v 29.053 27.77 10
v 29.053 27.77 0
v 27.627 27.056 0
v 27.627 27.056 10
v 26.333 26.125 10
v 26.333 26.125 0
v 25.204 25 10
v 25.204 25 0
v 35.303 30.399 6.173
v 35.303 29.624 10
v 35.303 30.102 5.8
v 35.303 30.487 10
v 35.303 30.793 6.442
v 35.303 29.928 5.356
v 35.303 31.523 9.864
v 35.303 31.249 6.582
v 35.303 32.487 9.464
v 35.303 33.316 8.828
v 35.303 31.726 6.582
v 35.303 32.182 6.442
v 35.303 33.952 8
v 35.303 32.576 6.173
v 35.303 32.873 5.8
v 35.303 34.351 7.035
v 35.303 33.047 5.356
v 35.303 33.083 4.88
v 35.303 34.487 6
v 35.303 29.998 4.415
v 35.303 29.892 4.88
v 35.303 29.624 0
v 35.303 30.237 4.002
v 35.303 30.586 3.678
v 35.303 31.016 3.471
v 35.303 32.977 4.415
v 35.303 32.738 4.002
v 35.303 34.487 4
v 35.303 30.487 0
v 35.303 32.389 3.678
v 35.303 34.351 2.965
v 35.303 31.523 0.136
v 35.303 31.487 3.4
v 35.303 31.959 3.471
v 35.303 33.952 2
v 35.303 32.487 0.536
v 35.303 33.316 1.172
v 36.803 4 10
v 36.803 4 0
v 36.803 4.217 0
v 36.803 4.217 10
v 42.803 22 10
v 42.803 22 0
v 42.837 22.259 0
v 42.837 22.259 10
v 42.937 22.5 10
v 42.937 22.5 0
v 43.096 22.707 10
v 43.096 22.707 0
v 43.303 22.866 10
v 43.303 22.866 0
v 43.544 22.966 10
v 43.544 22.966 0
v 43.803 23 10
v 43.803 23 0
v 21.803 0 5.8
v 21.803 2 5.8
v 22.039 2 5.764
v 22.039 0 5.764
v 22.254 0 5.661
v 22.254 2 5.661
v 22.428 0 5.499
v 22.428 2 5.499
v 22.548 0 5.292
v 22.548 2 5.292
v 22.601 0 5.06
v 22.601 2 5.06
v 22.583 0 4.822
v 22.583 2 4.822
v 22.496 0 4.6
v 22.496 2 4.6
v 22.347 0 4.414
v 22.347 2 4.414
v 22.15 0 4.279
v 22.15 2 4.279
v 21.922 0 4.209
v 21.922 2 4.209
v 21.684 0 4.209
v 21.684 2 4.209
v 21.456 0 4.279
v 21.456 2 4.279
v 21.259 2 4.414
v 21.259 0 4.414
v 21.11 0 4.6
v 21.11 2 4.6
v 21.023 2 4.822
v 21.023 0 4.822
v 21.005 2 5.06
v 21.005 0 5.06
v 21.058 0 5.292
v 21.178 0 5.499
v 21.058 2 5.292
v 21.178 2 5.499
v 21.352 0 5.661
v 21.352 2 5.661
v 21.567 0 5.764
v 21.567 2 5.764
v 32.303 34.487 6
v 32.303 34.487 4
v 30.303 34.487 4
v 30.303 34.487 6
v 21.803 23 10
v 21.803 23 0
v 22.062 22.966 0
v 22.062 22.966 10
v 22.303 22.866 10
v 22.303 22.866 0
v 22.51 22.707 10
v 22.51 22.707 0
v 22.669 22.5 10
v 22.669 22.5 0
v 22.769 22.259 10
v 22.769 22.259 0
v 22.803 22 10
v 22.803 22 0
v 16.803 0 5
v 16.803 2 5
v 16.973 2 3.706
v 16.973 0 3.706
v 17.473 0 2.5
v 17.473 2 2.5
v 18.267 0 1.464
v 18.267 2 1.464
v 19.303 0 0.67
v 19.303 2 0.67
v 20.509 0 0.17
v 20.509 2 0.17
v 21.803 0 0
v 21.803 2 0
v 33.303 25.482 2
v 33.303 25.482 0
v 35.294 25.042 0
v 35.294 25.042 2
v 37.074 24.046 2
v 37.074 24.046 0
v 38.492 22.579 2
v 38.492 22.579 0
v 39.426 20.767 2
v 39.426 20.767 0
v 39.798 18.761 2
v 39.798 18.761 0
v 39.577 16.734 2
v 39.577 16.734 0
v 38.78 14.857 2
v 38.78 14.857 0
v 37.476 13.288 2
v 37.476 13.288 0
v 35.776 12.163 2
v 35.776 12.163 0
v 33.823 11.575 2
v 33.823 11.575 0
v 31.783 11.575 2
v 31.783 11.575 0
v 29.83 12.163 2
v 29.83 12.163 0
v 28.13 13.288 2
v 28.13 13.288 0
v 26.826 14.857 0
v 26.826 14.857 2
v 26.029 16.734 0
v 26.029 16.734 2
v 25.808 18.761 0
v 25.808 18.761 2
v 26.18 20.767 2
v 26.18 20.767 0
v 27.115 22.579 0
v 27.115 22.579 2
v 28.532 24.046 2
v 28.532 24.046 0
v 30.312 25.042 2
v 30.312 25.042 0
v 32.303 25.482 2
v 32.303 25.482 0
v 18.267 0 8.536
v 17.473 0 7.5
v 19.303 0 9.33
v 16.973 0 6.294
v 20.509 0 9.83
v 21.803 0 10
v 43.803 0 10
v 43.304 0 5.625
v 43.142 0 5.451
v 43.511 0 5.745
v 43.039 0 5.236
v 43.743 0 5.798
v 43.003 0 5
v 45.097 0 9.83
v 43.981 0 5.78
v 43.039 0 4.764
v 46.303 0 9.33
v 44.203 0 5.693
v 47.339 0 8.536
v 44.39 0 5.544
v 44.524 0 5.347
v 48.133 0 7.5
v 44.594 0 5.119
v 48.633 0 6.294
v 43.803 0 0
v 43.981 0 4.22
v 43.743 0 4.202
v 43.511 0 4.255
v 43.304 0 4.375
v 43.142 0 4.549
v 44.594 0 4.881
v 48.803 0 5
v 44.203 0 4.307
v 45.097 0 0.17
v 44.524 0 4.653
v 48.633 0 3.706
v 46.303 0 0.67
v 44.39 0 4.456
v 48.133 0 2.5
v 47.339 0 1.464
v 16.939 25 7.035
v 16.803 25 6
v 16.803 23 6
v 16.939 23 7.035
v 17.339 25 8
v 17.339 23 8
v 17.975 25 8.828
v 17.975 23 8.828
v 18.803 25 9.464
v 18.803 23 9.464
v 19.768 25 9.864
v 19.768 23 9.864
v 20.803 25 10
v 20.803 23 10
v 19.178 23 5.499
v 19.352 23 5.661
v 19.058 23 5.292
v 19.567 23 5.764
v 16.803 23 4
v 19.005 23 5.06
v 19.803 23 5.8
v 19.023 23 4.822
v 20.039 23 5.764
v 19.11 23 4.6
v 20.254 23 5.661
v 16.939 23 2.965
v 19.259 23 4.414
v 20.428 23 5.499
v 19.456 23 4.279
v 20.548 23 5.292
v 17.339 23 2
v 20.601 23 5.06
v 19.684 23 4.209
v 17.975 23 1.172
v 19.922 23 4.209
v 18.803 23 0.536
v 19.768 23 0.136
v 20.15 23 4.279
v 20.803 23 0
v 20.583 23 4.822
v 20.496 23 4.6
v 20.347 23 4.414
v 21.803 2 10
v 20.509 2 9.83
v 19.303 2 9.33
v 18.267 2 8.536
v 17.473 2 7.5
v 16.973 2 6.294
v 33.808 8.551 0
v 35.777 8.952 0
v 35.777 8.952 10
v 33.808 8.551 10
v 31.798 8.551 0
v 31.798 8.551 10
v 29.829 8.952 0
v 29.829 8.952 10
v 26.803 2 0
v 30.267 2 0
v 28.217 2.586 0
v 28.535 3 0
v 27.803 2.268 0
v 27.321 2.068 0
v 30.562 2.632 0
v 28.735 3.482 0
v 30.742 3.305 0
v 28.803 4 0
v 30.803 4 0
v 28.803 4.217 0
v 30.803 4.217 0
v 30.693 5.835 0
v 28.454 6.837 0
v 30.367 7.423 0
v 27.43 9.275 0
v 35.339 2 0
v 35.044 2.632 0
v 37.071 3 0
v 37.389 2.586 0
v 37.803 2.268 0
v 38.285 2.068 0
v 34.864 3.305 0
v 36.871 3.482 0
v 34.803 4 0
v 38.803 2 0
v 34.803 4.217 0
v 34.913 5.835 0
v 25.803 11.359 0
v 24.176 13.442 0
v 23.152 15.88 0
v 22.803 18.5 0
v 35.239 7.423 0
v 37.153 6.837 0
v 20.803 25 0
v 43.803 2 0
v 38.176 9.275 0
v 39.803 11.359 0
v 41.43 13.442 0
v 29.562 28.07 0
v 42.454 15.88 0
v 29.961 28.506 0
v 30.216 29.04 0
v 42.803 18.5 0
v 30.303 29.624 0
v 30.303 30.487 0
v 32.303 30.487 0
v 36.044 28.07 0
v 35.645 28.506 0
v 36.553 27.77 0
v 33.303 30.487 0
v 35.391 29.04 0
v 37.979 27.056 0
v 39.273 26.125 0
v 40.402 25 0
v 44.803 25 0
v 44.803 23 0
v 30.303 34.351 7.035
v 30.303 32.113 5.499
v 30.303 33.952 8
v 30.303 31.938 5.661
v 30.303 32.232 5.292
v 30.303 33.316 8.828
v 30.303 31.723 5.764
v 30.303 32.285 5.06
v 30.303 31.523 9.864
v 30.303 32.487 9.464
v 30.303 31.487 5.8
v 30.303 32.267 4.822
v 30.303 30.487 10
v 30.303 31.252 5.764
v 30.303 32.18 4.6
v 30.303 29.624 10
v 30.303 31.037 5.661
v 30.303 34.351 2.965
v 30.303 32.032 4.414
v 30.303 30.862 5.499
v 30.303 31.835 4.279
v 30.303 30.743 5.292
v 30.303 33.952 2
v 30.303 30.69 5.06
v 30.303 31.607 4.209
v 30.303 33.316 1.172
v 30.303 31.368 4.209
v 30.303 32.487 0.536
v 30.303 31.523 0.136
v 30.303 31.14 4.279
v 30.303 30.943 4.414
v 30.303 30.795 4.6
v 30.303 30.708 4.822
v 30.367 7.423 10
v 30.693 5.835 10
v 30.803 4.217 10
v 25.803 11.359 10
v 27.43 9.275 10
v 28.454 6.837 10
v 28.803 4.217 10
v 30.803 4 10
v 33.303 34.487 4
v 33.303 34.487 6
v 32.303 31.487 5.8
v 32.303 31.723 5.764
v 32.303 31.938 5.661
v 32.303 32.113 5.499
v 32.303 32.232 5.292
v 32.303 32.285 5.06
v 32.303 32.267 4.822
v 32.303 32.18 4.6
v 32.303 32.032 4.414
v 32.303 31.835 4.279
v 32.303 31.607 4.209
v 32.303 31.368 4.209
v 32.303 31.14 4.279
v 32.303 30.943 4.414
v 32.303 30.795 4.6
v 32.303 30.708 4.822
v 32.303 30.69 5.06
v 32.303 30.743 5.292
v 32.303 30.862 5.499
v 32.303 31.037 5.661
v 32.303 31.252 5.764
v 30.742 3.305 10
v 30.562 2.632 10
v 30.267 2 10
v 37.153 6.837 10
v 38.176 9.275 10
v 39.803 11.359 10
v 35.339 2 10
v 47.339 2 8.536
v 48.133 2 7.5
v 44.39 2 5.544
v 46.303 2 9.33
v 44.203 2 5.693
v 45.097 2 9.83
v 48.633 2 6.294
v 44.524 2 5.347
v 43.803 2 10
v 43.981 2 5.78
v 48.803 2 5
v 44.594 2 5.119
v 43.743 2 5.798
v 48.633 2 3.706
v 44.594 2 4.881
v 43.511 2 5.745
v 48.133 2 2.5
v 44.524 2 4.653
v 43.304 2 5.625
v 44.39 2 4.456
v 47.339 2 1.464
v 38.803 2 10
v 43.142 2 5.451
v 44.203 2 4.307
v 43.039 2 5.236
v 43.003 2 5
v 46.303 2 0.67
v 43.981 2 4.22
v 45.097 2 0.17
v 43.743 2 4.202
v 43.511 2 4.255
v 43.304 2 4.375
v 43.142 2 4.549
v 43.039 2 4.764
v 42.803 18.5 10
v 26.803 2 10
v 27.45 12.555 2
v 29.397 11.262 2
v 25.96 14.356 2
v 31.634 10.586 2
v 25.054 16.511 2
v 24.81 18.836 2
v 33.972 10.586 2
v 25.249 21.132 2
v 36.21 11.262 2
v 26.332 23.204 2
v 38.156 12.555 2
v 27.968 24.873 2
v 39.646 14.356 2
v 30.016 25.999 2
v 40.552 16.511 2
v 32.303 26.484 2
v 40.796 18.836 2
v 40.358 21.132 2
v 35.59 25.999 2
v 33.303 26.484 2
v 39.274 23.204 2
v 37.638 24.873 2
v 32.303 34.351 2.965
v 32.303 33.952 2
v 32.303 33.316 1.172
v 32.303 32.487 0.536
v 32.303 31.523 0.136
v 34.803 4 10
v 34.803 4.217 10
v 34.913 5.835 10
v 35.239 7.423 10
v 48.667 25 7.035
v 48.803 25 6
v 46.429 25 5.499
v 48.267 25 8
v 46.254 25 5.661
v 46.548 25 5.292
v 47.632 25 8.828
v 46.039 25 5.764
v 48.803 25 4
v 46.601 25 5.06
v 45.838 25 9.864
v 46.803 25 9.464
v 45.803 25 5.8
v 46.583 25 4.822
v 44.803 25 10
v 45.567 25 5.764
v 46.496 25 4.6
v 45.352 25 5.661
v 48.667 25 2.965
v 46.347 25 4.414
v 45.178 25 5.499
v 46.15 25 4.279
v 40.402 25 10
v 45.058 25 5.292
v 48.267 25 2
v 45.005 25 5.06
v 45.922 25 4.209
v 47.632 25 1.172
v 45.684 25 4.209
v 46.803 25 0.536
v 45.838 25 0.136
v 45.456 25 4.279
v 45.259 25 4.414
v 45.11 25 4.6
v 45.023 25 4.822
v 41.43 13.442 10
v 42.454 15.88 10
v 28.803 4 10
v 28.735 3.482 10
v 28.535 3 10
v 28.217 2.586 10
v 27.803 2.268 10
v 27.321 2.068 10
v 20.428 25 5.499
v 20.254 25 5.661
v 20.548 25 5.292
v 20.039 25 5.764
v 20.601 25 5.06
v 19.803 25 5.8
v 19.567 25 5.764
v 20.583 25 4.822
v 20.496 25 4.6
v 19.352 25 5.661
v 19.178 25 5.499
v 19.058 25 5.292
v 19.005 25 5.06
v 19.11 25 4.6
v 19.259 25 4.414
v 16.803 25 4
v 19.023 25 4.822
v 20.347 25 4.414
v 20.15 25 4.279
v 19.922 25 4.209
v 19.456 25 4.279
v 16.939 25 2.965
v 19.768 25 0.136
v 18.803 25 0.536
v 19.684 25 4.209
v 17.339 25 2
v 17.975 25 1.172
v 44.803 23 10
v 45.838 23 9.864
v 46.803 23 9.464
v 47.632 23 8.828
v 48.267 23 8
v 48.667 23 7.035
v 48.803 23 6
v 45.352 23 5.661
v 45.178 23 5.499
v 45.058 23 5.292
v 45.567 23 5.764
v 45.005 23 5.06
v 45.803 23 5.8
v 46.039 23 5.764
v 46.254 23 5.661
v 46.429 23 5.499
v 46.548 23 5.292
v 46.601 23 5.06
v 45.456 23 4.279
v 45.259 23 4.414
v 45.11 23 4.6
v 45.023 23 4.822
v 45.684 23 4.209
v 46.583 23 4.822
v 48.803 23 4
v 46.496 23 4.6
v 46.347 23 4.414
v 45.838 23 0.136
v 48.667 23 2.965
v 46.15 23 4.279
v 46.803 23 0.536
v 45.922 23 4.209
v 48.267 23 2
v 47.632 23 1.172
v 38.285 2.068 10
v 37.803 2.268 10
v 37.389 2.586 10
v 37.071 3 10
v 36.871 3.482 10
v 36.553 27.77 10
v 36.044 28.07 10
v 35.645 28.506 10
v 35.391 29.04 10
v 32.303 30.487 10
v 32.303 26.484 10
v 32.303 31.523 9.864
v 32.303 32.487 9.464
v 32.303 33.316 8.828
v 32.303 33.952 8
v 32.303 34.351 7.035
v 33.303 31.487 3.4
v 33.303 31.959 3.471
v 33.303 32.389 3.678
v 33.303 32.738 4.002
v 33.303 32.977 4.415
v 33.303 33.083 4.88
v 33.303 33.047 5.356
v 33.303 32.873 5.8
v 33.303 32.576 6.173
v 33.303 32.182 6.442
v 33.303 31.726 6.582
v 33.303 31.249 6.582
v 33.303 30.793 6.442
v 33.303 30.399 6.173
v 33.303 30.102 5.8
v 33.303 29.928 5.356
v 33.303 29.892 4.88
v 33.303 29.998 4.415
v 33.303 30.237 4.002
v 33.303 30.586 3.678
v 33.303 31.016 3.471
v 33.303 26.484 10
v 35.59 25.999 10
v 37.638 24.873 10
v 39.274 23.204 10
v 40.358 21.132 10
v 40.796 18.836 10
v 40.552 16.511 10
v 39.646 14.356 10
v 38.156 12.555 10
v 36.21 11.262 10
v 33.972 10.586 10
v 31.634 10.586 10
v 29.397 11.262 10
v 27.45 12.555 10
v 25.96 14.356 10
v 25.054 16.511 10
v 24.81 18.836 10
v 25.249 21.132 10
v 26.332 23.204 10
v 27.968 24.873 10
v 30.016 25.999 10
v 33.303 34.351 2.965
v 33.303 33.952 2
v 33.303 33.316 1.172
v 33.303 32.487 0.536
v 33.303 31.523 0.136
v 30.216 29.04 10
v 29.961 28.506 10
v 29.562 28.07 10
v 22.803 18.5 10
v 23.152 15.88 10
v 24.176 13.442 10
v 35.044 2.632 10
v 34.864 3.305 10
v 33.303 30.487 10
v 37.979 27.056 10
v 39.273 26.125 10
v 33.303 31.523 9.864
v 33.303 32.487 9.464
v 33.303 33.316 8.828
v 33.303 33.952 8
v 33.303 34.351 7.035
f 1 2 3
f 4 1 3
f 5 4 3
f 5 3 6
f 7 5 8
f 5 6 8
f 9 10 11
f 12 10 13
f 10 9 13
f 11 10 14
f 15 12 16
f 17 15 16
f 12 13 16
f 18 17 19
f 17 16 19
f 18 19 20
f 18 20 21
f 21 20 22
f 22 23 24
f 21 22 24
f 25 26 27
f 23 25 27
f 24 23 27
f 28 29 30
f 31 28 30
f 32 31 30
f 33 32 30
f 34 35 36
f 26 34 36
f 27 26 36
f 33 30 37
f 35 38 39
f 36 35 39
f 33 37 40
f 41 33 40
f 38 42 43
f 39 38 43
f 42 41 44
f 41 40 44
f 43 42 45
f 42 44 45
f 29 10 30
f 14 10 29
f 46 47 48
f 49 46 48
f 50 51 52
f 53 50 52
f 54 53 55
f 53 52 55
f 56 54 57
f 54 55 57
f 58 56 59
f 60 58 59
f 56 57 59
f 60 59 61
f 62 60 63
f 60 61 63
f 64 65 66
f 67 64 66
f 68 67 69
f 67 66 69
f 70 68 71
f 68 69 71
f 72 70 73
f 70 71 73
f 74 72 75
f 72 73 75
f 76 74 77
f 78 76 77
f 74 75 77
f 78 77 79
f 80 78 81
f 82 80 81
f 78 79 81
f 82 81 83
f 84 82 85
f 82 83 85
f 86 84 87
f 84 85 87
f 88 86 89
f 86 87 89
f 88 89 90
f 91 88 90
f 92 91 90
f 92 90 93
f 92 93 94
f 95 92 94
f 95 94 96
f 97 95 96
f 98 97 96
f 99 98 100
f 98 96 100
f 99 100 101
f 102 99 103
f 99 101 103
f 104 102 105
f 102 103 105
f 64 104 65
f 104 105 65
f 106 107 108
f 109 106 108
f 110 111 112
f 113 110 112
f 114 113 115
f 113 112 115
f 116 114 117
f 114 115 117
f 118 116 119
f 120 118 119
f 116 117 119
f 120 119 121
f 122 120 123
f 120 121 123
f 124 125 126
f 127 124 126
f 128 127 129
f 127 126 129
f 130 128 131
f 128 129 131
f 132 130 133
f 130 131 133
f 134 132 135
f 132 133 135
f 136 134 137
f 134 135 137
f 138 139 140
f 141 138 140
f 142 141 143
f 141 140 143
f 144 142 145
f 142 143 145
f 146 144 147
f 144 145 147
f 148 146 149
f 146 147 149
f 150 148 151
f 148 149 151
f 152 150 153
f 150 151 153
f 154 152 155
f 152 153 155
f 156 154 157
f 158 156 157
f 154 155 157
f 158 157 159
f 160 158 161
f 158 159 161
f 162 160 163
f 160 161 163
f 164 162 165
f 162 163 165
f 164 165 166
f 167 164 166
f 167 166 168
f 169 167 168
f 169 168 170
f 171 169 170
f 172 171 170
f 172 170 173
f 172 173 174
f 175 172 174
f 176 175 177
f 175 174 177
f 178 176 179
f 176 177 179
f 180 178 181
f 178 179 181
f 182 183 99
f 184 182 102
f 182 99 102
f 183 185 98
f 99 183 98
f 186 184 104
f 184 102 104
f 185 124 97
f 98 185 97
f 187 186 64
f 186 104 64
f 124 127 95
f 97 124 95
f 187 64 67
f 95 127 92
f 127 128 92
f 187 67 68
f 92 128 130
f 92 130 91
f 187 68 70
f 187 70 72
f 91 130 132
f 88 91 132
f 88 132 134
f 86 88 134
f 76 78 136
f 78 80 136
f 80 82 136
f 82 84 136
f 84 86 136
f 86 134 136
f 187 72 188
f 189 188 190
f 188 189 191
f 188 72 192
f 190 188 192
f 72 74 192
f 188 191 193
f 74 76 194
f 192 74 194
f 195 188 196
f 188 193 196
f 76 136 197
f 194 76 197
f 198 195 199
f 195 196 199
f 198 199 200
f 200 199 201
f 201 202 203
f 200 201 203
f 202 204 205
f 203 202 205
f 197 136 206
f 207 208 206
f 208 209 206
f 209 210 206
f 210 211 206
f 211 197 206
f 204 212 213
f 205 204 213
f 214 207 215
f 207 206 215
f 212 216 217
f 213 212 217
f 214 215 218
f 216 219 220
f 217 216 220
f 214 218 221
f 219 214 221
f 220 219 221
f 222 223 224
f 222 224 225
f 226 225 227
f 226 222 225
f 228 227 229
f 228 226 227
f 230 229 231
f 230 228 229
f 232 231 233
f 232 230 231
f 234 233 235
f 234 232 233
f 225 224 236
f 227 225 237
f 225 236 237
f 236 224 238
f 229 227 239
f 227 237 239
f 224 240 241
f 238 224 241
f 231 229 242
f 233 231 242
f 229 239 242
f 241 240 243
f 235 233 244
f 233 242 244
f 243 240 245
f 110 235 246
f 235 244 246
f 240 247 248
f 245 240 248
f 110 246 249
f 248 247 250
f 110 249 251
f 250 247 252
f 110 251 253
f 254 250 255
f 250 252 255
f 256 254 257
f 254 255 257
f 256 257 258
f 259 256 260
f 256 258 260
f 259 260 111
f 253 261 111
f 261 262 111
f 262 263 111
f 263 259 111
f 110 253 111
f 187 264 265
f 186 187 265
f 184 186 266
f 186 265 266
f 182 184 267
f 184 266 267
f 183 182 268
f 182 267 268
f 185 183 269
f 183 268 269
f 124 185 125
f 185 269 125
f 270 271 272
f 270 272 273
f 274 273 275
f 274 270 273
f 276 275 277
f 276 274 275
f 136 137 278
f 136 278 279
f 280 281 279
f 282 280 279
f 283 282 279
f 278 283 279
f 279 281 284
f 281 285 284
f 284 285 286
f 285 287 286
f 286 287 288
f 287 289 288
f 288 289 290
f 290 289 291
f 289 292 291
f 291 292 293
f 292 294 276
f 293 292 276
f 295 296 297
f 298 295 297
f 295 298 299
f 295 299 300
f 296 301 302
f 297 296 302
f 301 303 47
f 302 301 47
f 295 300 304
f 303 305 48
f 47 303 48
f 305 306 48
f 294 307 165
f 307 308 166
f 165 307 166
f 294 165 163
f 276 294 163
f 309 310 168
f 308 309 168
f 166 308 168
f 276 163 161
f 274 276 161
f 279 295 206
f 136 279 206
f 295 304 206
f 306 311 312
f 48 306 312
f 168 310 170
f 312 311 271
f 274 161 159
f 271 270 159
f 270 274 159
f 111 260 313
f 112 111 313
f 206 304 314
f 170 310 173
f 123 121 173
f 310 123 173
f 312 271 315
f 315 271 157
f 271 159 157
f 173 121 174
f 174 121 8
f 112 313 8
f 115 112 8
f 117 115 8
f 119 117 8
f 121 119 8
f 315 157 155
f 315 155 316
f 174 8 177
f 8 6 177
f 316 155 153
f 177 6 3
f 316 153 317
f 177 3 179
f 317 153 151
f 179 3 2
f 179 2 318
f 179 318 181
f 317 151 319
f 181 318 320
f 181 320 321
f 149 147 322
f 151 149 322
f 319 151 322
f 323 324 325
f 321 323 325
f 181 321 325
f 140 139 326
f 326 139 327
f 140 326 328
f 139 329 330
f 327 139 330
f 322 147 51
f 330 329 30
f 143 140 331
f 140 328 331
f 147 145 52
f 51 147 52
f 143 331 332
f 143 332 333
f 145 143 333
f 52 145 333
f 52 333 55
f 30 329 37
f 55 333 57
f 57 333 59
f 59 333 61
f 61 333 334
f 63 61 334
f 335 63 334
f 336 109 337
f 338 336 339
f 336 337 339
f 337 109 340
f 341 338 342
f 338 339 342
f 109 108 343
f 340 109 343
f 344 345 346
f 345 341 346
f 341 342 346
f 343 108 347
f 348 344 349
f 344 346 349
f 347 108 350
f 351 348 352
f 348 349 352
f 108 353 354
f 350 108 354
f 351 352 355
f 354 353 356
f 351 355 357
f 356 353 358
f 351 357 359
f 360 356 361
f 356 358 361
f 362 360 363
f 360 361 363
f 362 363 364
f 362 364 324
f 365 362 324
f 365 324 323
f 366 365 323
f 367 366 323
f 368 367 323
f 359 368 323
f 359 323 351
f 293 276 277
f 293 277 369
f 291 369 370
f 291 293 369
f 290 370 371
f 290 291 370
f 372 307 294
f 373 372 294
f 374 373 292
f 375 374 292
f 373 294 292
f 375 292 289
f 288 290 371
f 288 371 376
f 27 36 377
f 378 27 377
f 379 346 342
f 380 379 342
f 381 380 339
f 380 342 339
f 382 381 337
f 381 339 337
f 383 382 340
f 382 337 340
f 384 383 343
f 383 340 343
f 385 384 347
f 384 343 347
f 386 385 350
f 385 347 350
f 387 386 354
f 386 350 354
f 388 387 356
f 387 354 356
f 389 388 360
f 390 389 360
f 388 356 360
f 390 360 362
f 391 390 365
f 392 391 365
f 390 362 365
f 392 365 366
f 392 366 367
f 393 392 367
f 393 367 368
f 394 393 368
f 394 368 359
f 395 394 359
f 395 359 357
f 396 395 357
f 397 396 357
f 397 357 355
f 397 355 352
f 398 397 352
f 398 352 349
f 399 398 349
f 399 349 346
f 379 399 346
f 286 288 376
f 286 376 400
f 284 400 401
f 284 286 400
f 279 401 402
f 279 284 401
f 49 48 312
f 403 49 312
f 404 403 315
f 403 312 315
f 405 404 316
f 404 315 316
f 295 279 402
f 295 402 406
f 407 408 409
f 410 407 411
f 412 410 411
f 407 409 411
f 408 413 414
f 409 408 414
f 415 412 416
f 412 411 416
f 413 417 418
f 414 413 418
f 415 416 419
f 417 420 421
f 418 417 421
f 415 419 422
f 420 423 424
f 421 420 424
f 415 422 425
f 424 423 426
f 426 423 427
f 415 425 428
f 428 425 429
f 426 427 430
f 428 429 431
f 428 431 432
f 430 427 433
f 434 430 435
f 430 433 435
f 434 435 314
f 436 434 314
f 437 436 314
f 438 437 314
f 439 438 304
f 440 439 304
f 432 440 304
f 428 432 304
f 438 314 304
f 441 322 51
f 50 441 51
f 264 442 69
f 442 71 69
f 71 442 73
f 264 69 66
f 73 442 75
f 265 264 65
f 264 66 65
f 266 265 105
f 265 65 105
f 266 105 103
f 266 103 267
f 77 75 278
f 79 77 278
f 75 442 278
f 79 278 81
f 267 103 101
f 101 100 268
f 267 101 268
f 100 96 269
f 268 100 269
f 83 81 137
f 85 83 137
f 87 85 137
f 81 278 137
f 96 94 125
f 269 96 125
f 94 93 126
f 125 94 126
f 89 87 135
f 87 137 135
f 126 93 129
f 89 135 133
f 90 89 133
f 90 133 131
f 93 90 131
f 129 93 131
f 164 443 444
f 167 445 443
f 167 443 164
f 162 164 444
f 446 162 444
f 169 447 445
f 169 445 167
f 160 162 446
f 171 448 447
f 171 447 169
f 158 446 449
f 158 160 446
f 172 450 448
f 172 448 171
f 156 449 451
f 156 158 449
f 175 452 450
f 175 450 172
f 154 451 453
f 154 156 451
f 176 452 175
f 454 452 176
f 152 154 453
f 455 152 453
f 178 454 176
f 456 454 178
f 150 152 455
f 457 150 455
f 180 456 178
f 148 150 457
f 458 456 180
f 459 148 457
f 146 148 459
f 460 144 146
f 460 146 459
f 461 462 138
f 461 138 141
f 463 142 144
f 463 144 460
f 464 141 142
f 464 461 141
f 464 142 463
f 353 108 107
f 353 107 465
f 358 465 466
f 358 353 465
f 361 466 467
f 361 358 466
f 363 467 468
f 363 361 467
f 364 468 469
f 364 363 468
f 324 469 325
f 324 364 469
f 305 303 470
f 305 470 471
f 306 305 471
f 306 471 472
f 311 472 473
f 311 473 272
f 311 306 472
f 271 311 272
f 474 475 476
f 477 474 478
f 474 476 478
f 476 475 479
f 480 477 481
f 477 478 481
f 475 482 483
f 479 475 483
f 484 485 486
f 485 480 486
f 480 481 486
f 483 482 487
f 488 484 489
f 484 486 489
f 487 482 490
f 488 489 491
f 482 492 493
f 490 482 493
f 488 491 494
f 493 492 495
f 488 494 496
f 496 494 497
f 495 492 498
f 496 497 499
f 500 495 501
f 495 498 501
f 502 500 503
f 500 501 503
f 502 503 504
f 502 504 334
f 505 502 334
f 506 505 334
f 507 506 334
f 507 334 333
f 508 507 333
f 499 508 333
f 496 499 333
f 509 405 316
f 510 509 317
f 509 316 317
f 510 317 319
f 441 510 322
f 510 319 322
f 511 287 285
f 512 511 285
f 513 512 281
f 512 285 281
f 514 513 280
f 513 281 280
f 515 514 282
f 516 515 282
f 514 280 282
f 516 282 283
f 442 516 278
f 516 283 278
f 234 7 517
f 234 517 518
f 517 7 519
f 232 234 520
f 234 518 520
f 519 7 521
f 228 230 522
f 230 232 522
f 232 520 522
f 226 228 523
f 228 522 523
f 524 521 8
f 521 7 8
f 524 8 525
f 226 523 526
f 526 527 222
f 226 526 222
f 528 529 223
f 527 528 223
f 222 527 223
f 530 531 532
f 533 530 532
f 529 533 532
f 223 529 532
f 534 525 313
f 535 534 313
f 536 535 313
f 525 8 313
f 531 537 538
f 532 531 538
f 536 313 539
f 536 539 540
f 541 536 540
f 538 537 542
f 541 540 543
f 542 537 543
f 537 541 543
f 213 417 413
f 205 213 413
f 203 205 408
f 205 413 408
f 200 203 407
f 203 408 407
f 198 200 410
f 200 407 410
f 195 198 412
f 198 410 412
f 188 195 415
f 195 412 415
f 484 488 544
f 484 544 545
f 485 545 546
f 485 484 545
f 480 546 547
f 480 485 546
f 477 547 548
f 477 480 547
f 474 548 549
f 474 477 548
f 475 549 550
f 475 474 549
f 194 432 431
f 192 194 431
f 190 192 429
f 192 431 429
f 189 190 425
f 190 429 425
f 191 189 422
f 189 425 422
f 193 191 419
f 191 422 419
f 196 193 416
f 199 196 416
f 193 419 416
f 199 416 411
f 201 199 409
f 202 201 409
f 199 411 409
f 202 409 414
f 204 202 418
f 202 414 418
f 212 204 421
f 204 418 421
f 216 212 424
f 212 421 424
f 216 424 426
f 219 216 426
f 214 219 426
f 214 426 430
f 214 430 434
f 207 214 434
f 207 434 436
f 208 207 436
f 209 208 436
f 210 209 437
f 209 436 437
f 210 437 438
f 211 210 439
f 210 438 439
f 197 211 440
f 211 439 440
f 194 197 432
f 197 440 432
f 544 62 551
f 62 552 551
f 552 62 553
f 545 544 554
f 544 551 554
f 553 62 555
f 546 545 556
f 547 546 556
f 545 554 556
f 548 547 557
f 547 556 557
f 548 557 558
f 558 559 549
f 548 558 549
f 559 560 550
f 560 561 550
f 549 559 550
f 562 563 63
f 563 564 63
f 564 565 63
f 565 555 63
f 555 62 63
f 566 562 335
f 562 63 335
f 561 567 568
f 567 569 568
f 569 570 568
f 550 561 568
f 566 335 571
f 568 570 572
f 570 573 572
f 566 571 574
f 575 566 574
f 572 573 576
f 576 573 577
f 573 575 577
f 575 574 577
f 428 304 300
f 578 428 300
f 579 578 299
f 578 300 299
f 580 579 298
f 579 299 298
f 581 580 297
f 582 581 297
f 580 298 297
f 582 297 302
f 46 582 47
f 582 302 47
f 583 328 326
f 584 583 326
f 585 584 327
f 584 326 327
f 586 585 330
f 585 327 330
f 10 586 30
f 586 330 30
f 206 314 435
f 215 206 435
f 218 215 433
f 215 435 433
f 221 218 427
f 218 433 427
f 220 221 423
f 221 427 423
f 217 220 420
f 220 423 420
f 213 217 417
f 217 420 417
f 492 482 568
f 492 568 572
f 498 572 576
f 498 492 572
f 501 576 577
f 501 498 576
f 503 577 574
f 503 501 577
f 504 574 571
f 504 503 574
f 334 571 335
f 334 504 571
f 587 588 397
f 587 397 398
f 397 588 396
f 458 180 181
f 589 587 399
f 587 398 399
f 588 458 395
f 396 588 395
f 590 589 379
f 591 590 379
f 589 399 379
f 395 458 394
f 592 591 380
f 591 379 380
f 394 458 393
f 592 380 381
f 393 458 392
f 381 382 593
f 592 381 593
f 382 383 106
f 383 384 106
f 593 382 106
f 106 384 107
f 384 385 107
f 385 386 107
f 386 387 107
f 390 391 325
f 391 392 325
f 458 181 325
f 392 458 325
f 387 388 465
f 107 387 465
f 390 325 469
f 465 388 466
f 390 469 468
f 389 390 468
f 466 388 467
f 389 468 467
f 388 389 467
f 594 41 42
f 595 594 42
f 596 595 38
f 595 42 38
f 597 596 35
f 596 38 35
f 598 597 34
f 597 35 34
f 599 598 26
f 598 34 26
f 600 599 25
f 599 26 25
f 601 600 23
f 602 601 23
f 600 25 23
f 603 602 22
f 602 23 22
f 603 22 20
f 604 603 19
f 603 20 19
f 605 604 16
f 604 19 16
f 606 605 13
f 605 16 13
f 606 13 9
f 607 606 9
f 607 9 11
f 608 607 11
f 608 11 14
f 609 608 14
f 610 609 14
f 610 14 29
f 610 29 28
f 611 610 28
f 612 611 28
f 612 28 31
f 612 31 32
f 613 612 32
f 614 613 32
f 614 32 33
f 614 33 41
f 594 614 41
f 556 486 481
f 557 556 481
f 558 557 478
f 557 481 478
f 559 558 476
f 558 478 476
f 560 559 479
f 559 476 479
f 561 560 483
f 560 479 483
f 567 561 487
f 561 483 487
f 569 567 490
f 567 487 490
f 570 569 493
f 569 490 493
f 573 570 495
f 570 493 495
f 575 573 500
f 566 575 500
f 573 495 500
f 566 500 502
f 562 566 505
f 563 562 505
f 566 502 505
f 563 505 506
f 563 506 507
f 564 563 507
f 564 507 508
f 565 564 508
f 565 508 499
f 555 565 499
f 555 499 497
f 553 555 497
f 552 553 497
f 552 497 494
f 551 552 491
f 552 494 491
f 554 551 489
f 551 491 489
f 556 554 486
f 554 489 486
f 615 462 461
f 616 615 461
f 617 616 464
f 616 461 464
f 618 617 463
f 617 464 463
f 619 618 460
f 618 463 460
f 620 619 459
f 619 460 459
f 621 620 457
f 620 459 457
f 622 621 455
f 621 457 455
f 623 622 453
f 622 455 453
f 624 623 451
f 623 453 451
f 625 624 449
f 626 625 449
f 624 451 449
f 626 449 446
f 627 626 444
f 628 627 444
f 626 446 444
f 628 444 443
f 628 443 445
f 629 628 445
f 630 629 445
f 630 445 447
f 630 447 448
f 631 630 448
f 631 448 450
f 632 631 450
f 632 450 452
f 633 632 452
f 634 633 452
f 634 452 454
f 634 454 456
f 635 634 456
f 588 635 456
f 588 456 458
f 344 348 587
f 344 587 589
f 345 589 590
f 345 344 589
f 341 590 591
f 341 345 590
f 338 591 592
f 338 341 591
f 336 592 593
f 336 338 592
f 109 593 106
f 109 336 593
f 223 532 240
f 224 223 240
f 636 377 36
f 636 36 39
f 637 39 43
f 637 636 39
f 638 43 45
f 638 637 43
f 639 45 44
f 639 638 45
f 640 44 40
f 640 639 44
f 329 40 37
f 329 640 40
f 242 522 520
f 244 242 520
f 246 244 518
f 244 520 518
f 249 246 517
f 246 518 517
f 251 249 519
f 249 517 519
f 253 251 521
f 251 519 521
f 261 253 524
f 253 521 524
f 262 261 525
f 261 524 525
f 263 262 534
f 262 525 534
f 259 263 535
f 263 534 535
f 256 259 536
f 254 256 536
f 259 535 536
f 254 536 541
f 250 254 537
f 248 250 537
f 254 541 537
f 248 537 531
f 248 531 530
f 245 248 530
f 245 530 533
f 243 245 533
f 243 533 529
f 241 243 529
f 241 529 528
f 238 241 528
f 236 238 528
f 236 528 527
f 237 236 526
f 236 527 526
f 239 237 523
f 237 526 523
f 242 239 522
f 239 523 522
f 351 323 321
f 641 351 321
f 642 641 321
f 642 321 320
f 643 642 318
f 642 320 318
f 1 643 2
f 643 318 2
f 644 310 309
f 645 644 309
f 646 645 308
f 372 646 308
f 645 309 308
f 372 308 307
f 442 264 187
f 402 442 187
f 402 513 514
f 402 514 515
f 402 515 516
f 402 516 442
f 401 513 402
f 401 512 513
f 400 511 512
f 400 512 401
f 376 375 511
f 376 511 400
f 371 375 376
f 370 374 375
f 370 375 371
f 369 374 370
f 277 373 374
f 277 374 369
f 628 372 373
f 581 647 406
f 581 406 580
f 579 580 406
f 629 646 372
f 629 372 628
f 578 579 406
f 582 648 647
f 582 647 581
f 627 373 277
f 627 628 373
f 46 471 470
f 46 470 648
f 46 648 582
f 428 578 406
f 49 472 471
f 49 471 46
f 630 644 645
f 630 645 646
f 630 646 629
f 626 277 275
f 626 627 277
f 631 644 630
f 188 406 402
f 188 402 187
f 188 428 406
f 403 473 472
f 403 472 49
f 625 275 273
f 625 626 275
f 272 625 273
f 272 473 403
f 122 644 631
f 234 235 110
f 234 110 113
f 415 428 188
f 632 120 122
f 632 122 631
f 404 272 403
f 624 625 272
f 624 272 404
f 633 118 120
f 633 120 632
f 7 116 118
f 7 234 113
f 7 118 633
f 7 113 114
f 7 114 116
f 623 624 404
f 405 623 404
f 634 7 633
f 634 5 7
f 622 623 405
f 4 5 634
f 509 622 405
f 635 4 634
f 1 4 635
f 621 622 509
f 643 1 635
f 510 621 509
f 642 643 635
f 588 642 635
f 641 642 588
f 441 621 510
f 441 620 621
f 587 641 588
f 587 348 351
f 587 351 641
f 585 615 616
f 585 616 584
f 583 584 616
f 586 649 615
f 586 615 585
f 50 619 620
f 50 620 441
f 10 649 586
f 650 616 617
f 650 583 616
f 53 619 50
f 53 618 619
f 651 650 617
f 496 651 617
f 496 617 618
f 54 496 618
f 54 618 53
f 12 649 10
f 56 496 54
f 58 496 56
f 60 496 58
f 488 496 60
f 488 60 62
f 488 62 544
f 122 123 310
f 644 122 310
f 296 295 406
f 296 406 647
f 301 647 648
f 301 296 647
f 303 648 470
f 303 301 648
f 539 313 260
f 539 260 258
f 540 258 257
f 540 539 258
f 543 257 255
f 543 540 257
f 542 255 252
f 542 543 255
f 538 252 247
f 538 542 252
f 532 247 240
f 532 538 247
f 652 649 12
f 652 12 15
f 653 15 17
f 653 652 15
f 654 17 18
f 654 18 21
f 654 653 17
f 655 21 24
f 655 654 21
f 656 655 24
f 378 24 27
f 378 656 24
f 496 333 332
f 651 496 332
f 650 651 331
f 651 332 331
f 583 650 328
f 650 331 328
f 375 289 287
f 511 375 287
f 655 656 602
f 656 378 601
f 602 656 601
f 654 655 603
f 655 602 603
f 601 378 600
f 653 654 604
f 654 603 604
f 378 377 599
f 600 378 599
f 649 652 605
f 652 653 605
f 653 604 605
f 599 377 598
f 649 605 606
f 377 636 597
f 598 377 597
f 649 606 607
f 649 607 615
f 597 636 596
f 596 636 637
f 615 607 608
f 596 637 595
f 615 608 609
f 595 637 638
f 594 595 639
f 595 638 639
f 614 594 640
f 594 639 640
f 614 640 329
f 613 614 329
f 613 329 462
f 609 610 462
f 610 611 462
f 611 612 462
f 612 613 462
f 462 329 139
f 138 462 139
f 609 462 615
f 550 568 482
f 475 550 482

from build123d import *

# Parameters (mm, degrees)
BOSS_EXTRUDE1_DEPTH = 10
SKETCH3_R           = 0.8
CUT_EXTRUDE1_DEPTH  = 2
SKETCH4_R           = 0.8
CUT_EXTRUDE2_DEPTH  = 2
SKETCH5_R           = 0.8
CUT_EXTRUDE3_DEPTH  = 2
SKETCH6_R           = 0.8
CUT_EXTRUDE4_DEPTH  = 3
SKETCH7_R           = 1.6
CUT_EXTRUDE5_DEPTH  = 3
CUT_EXTRUDE6_DEPTH  = 10
BOSS_EXTRUDE2_DEPTH = 2


with BuildPart() as part:
    # Sketch1 → Boss-Extrude1 (new body)
    with BuildSketch(Plane.XY):
        with BuildLine():
            Line((16.803004448, 0), (48.803096805, 0))
            Line((48.803096805, 0), (48.803096805, 2))
            Line((48.803096805, 2), (38.803096805, 2))
            ThreePointArc((38.803096805, 2), (37.388883243, 2.585786438), (36.803096805, 4))
            Line((36.803096805, 4), (36.803096805, 4.217123744))
            ThreePointArc((36.803096805, 4.217123744), (37.58355047, 8.090102619), (39.803089878, 11.358545383))
            ThreePointArc((39.803089878, 11.358545383), (42.022639537, 14.62700324), (42.803096805, 18.5))
            Line((42.803096805, 18.5), (42.803096805, 22))
            ThreePointArc((42.803096805, 22), (43.095990024, 22.707106781), (43.803096805, 23))
            Line((43.803096805, 23), (48.803096805, 23))
            Line((48.803096805, 23), (48.803096805, 25))
            Line((48.803096805, 25), (44.105786895, 25))
            Line((44.105786895, 25), (40.40245347, 25))
            ThreePointArc((40.40245347, 25), (38.644426823, 26.616603213), (36.553207437, 27.770234489))
            ThreePointArc((36.553207437, 27.770234489), (35.644914528, 28.506251313), (35.303235335, 29.624272825))
            Line((35.303235335, 29.624272825), (35.303235335, 34.487492178))
            Line((35.303235335, 34.487492178), (33.303050626, 34.487492178))
            Line((33.303050626, 34.487492178), (33.303050626, 26.484348185))
            ThreePointArc((33.303050626, 26.484348185), (32.803050626, 10.500011503), (32.303050626, 26.484348185))
            Line((32.303050626, 26.484348185), (32.303050626, 34.487492178))
            Line((32.303050626, 34.487492178), (30.303050626, 34.487492178))
            Line((30.303050626, 34.487492178), (30.303050626, 29.624347545))
            ThreePointArc((30.303050626, 29.624347545), (29.961362151, 28.506312265), (29.05304774, 27.770296755))
            ThreePointArc((29.05304774, 27.770296755), (26.961741815, 26.616651708), (25.203647783, 25))
            Line((25.203647783, 25), (21.500314358, 25))
            Line((21.500314358, 25), (16.803004448, 25))
            Line((16.803004448, 25), (16.803004448, 23))
            Line((16.803004448, 23), (21.803004448, 23))
            ThreePointArc((21.803004448, 23), (22.510111229, 22.707106781), (22.803004448, 22))
            Line((22.803004448, 22), (22.803004448, 18.5))
            ThreePointArc((22.803004448, 18.5), (23.583461716, 14.62700324), (25.803011375, 11.358545383))
            ThreePointArc((25.803011375, 11.358545383), (28.022550783, 8.090102619), (28.803004448, 4.217123744))
            Line((28.803004448, 4.217123744), (28.803004448, 4))
            ThreePointArc((28.803004448, 4), (28.21721801, 2.585786438), (26.803004448, 2))
            Line((26.803004448, 2), (16.803004448, 2))
            Line((16.803004448, 2), (16.803004448, 0))
        make_face()
        with BuildLine():
            Line((34.803096805, 4), (34.803096805, 4.217123744))
            ThreePointArc((34.803096805, 4.217123744), (35.049071096, 6.634328662), (35.776910074, 8.952438536))
            ThreePointArc((35.776910074, 8.952438536), (32.803050626, 8.500011503), (29.829191179, 8.952438536))
            ThreePointArc((29.829191179, 8.952438536), (30.557030157, 6.634328662), (30.803004448, 4.217123744))
            Line((30.803004448, 4.217123744), (30.803004448, 4))
            ThreePointArc((30.803004448, 4), (30.666707753, 2.96472382), (30.267106063, 2))
            Line((30.267106063, 2), (35.33899519, 2))
            ThreePointArc((35.33899519, 2), (34.9393935, 2.96472382), (34.803096805, 4))
        make_face(mode=Mode.SUBTRACT)
    extrude(amount=BOSS_EXTRUDE1_DEPTH)

    # Sketch3 → Cut-Extrude1 (cut)
    with BuildSketch(Plane(origin=(0, 2, 0), x_dir=(1, 0, 0), z_dir=(0, 1, 0))):
        with BuildLine():
            ThreePointArc((48.803096805, -5), (47.338630711, -8.535533906), (43.803096805, -10))
            Line((43.803096805, -10), (48.803096805, -10))
            Line((48.803096805, -10), (48.803096805, -5))
        make_face()
        with BuildLine():
            ThreePointArc((43.803096805, 0), (47.338630711, -1.464466094), (48.803096805, -5))
            Line((48.803096805, -5), (48.803096805, 0))
            Line((48.803096805, 0), (43.803096805, 0))
        make_face()
        with Locations((43.803096805, -5)):
            Circle(SKETCH3_R)
    extrude(amount=-CUT_EXTRUDE1_DEPTH, mode=Mode.SUBTRACT)

    # Sketch4 → Cut-Extrude2 (cut)
    with BuildSketch(Plane(origin=(0, 2, 0), x_dir=(1, 0, 0), z_dir=(0, 1, 0))):
        with BuildLine():
            Line((16.803004448, 0), (16.803004448, -5))
            ThreePointArc((16.803004448, -5), (18.267470542, -1.464466094), (21.803004448, 0))
            Line((21.803004448, 0), (16.803004448, 0))
        make_face()
        with BuildLine():
            Line((16.803004448, -10), (21.803004448, -10))
            ThreePointArc((21.803004448, -10), (18.267470542, -8.535533906), (16.803004448, -5))
            Line((16.803004448, -5), (16.803004448, -10))
        make_face()
        with Locations((21.803004448, -5)):
            Circle(SKETCH4_R)
    extrude(amount=-CUT_EXTRUDE2_DEPTH, mode=Mode.SUBTRACT)

    # Sketch5 → Cut-Extrude3 (cut)
    with BuildSketch(Plane(origin=(0, 25, 0), x_dir=(1, 0, 0), z_dir=(0, 1, 0))):
        with Locations((19.803004448, -5)):
            Circle(SKETCH5_R)
        with Locations((45.803096805, -5)):
            Circle(SKETCH5_R)
        with BuildLine():
            Line((20.803004448, -10), (16.803004448, -10))
            Line((16.803004448, -10), (16.803004448, -6))
            ThreePointArc((16.803004448, -6), (17.974577323, -8.828427125), (20.803004448, -10))
        make_face()
        with BuildLine():
            Line((16.803004448, -4), (16.803004448, 0))
            Line((16.803004448, 0), (20.803004448, 0))
            ThreePointArc((20.803004448, 0), (17.974577323, -1.171572875), (16.803004448, -4))
        make_face()
        with BuildLine():
            Line((44.803096805, 0), (48.803096805, 0))
            Line((48.803096805, 0), (48.803096805, -4))
            ThreePointArc((48.803096805, -4), (47.63152393, -1.171572875), (44.803096805, 0))
        make_face()
        with BuildLine():
            Line((48.803096805, -6), (48.803096805, -10))
            Line((48.803096805, -10), (44.803096805, -10))
            ThreePointArc((44.803096805, -10), (47.63152393, -8.828427125), (48.803096805, -6))
        make_face()
    extrude(amount=-CUT_EXTRUDE3_DEPTH, mode=Mode.SUBTRACT)

    # Sketch6 → Cut-Extrude4 (cut)
    with BuildSketch(Plane.ZY.offset(-30.303050626)):
        with Locations((5, 31.487492178)):
            Circle(SKETCH6_R)
    extrude(amount=-CUT_EXTRUDE4_DEPTH, mode=Mode.SUBTRACT)

    # Sketch7 → Cut-Extrude5 (cut)
    with BuildSketch(Plane(origin=(35.303235335, 0, 0), x_dir=(0, 0, -1), z_dir=(1, 0, 0))):
        with Locations((-5, 31.487492178)):
            Circle(SKETCH7_R)
    extrude(amount=-CUT_EXTRUDE5_DEPTH, mode=Mode.SUBTRACT)

    # Sketch8 → Cut-Extrude6 (cut)
    with BuildSketch(Plane.ZY.offset(-30.303050626)):
        with BuildLine():
            Line((0, 30.487492178), (0, 34.487492178))
            Line((0, 34.487492178), (4, 34.487492178))
            ThreePointArc((4, 34.487492178), (1.171572875, 33.315919302), (0, 30.487492178))
        make_face()
        with BuildLine():
            Line((6, 34.487492178), (10, 34.487492178))
            Line((10, 34.487492178), (10, 30.487492178))
            ThreePointArc((10, 30.487492178), (8.828427125, 33.315919302), (6, 34.487492178))
        make_face()
    extrude(amount=-CUT_EXTRUDE6_DEPTH, mode=Mode.SUBTRACT)

    # Sketch9 → Boss-Extrude2 (add)
    with BuildSketch(Plane(origin=(0, 0, 0), x_dir=(-1, 0, 0), z_dir=(0, 0, -1))):
        with BuildLine():
            Line((-33.303050626, 26.484348185), (-33.303050626, 25.482120022))
            ThreePointArc((-33.303050626, 25.482120022), (-32.803050626, 11.5), (-32.303050626, 25.482120022))
            Line((-32.303050626, 25.482120022), (-32.303050626, 26.484348185))
            ThreePointArc((-32.303050626, 26.484348185), (-32.803050626, 10.500011503), (-33.303050626, 26.484348185))
        make_face()
    extrude(amount=-BOSS_EXTRUDE2_DEPTH)


solid = part.part
